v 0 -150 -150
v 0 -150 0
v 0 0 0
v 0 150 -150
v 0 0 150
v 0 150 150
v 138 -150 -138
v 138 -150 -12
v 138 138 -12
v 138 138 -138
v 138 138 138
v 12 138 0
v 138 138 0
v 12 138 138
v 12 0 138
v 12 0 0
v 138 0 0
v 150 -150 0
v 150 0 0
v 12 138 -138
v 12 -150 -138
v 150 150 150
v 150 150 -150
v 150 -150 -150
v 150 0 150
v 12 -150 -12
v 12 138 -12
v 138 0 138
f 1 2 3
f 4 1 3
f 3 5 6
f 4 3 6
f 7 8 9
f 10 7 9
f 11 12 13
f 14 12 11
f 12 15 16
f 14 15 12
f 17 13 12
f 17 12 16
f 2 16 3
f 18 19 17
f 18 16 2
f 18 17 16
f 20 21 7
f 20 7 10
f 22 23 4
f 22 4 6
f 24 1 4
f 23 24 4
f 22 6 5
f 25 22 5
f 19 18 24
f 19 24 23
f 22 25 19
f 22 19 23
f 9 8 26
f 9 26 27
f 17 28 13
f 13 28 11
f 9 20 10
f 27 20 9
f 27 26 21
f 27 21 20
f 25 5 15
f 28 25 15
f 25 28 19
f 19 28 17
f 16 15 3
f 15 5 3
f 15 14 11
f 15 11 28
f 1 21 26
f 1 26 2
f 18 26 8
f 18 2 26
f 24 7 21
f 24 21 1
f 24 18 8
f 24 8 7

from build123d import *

# Parameters (mm, degrees)
F1_DEPTH = 150
F2_T     = -12
F4_DEPTH = 150


with BuildPart() as f1:
    # F0 (on Right) → F1 (new body)
    with BuildSketch(Plane.YZ):
        Polygon((-150, -150), (150, -150), (150, 150), (0, 150), (0, 0), (-150, 0), align=None)
    extrude(amount=F1_DEPTH)

    # F2
    f2_openings = [f1.faces().sort_by_distance(p)[0] for p in [
        (75, 0, 75),
        (75, -75, 0),
        (75, -150, -75),
    ]]
    offset(amount=F2_T, openings=f2_openings)

    # F3 (on face) → F4 (join)
    with BuildSketch(Plane.YZ.offset(150)):
        Polygon((0, 0), (-150, 0), (-150, -12), (150, -12), (150, 0), align=None)
    extrude(amount=-F4_DEPTH)


solid = f1.part
